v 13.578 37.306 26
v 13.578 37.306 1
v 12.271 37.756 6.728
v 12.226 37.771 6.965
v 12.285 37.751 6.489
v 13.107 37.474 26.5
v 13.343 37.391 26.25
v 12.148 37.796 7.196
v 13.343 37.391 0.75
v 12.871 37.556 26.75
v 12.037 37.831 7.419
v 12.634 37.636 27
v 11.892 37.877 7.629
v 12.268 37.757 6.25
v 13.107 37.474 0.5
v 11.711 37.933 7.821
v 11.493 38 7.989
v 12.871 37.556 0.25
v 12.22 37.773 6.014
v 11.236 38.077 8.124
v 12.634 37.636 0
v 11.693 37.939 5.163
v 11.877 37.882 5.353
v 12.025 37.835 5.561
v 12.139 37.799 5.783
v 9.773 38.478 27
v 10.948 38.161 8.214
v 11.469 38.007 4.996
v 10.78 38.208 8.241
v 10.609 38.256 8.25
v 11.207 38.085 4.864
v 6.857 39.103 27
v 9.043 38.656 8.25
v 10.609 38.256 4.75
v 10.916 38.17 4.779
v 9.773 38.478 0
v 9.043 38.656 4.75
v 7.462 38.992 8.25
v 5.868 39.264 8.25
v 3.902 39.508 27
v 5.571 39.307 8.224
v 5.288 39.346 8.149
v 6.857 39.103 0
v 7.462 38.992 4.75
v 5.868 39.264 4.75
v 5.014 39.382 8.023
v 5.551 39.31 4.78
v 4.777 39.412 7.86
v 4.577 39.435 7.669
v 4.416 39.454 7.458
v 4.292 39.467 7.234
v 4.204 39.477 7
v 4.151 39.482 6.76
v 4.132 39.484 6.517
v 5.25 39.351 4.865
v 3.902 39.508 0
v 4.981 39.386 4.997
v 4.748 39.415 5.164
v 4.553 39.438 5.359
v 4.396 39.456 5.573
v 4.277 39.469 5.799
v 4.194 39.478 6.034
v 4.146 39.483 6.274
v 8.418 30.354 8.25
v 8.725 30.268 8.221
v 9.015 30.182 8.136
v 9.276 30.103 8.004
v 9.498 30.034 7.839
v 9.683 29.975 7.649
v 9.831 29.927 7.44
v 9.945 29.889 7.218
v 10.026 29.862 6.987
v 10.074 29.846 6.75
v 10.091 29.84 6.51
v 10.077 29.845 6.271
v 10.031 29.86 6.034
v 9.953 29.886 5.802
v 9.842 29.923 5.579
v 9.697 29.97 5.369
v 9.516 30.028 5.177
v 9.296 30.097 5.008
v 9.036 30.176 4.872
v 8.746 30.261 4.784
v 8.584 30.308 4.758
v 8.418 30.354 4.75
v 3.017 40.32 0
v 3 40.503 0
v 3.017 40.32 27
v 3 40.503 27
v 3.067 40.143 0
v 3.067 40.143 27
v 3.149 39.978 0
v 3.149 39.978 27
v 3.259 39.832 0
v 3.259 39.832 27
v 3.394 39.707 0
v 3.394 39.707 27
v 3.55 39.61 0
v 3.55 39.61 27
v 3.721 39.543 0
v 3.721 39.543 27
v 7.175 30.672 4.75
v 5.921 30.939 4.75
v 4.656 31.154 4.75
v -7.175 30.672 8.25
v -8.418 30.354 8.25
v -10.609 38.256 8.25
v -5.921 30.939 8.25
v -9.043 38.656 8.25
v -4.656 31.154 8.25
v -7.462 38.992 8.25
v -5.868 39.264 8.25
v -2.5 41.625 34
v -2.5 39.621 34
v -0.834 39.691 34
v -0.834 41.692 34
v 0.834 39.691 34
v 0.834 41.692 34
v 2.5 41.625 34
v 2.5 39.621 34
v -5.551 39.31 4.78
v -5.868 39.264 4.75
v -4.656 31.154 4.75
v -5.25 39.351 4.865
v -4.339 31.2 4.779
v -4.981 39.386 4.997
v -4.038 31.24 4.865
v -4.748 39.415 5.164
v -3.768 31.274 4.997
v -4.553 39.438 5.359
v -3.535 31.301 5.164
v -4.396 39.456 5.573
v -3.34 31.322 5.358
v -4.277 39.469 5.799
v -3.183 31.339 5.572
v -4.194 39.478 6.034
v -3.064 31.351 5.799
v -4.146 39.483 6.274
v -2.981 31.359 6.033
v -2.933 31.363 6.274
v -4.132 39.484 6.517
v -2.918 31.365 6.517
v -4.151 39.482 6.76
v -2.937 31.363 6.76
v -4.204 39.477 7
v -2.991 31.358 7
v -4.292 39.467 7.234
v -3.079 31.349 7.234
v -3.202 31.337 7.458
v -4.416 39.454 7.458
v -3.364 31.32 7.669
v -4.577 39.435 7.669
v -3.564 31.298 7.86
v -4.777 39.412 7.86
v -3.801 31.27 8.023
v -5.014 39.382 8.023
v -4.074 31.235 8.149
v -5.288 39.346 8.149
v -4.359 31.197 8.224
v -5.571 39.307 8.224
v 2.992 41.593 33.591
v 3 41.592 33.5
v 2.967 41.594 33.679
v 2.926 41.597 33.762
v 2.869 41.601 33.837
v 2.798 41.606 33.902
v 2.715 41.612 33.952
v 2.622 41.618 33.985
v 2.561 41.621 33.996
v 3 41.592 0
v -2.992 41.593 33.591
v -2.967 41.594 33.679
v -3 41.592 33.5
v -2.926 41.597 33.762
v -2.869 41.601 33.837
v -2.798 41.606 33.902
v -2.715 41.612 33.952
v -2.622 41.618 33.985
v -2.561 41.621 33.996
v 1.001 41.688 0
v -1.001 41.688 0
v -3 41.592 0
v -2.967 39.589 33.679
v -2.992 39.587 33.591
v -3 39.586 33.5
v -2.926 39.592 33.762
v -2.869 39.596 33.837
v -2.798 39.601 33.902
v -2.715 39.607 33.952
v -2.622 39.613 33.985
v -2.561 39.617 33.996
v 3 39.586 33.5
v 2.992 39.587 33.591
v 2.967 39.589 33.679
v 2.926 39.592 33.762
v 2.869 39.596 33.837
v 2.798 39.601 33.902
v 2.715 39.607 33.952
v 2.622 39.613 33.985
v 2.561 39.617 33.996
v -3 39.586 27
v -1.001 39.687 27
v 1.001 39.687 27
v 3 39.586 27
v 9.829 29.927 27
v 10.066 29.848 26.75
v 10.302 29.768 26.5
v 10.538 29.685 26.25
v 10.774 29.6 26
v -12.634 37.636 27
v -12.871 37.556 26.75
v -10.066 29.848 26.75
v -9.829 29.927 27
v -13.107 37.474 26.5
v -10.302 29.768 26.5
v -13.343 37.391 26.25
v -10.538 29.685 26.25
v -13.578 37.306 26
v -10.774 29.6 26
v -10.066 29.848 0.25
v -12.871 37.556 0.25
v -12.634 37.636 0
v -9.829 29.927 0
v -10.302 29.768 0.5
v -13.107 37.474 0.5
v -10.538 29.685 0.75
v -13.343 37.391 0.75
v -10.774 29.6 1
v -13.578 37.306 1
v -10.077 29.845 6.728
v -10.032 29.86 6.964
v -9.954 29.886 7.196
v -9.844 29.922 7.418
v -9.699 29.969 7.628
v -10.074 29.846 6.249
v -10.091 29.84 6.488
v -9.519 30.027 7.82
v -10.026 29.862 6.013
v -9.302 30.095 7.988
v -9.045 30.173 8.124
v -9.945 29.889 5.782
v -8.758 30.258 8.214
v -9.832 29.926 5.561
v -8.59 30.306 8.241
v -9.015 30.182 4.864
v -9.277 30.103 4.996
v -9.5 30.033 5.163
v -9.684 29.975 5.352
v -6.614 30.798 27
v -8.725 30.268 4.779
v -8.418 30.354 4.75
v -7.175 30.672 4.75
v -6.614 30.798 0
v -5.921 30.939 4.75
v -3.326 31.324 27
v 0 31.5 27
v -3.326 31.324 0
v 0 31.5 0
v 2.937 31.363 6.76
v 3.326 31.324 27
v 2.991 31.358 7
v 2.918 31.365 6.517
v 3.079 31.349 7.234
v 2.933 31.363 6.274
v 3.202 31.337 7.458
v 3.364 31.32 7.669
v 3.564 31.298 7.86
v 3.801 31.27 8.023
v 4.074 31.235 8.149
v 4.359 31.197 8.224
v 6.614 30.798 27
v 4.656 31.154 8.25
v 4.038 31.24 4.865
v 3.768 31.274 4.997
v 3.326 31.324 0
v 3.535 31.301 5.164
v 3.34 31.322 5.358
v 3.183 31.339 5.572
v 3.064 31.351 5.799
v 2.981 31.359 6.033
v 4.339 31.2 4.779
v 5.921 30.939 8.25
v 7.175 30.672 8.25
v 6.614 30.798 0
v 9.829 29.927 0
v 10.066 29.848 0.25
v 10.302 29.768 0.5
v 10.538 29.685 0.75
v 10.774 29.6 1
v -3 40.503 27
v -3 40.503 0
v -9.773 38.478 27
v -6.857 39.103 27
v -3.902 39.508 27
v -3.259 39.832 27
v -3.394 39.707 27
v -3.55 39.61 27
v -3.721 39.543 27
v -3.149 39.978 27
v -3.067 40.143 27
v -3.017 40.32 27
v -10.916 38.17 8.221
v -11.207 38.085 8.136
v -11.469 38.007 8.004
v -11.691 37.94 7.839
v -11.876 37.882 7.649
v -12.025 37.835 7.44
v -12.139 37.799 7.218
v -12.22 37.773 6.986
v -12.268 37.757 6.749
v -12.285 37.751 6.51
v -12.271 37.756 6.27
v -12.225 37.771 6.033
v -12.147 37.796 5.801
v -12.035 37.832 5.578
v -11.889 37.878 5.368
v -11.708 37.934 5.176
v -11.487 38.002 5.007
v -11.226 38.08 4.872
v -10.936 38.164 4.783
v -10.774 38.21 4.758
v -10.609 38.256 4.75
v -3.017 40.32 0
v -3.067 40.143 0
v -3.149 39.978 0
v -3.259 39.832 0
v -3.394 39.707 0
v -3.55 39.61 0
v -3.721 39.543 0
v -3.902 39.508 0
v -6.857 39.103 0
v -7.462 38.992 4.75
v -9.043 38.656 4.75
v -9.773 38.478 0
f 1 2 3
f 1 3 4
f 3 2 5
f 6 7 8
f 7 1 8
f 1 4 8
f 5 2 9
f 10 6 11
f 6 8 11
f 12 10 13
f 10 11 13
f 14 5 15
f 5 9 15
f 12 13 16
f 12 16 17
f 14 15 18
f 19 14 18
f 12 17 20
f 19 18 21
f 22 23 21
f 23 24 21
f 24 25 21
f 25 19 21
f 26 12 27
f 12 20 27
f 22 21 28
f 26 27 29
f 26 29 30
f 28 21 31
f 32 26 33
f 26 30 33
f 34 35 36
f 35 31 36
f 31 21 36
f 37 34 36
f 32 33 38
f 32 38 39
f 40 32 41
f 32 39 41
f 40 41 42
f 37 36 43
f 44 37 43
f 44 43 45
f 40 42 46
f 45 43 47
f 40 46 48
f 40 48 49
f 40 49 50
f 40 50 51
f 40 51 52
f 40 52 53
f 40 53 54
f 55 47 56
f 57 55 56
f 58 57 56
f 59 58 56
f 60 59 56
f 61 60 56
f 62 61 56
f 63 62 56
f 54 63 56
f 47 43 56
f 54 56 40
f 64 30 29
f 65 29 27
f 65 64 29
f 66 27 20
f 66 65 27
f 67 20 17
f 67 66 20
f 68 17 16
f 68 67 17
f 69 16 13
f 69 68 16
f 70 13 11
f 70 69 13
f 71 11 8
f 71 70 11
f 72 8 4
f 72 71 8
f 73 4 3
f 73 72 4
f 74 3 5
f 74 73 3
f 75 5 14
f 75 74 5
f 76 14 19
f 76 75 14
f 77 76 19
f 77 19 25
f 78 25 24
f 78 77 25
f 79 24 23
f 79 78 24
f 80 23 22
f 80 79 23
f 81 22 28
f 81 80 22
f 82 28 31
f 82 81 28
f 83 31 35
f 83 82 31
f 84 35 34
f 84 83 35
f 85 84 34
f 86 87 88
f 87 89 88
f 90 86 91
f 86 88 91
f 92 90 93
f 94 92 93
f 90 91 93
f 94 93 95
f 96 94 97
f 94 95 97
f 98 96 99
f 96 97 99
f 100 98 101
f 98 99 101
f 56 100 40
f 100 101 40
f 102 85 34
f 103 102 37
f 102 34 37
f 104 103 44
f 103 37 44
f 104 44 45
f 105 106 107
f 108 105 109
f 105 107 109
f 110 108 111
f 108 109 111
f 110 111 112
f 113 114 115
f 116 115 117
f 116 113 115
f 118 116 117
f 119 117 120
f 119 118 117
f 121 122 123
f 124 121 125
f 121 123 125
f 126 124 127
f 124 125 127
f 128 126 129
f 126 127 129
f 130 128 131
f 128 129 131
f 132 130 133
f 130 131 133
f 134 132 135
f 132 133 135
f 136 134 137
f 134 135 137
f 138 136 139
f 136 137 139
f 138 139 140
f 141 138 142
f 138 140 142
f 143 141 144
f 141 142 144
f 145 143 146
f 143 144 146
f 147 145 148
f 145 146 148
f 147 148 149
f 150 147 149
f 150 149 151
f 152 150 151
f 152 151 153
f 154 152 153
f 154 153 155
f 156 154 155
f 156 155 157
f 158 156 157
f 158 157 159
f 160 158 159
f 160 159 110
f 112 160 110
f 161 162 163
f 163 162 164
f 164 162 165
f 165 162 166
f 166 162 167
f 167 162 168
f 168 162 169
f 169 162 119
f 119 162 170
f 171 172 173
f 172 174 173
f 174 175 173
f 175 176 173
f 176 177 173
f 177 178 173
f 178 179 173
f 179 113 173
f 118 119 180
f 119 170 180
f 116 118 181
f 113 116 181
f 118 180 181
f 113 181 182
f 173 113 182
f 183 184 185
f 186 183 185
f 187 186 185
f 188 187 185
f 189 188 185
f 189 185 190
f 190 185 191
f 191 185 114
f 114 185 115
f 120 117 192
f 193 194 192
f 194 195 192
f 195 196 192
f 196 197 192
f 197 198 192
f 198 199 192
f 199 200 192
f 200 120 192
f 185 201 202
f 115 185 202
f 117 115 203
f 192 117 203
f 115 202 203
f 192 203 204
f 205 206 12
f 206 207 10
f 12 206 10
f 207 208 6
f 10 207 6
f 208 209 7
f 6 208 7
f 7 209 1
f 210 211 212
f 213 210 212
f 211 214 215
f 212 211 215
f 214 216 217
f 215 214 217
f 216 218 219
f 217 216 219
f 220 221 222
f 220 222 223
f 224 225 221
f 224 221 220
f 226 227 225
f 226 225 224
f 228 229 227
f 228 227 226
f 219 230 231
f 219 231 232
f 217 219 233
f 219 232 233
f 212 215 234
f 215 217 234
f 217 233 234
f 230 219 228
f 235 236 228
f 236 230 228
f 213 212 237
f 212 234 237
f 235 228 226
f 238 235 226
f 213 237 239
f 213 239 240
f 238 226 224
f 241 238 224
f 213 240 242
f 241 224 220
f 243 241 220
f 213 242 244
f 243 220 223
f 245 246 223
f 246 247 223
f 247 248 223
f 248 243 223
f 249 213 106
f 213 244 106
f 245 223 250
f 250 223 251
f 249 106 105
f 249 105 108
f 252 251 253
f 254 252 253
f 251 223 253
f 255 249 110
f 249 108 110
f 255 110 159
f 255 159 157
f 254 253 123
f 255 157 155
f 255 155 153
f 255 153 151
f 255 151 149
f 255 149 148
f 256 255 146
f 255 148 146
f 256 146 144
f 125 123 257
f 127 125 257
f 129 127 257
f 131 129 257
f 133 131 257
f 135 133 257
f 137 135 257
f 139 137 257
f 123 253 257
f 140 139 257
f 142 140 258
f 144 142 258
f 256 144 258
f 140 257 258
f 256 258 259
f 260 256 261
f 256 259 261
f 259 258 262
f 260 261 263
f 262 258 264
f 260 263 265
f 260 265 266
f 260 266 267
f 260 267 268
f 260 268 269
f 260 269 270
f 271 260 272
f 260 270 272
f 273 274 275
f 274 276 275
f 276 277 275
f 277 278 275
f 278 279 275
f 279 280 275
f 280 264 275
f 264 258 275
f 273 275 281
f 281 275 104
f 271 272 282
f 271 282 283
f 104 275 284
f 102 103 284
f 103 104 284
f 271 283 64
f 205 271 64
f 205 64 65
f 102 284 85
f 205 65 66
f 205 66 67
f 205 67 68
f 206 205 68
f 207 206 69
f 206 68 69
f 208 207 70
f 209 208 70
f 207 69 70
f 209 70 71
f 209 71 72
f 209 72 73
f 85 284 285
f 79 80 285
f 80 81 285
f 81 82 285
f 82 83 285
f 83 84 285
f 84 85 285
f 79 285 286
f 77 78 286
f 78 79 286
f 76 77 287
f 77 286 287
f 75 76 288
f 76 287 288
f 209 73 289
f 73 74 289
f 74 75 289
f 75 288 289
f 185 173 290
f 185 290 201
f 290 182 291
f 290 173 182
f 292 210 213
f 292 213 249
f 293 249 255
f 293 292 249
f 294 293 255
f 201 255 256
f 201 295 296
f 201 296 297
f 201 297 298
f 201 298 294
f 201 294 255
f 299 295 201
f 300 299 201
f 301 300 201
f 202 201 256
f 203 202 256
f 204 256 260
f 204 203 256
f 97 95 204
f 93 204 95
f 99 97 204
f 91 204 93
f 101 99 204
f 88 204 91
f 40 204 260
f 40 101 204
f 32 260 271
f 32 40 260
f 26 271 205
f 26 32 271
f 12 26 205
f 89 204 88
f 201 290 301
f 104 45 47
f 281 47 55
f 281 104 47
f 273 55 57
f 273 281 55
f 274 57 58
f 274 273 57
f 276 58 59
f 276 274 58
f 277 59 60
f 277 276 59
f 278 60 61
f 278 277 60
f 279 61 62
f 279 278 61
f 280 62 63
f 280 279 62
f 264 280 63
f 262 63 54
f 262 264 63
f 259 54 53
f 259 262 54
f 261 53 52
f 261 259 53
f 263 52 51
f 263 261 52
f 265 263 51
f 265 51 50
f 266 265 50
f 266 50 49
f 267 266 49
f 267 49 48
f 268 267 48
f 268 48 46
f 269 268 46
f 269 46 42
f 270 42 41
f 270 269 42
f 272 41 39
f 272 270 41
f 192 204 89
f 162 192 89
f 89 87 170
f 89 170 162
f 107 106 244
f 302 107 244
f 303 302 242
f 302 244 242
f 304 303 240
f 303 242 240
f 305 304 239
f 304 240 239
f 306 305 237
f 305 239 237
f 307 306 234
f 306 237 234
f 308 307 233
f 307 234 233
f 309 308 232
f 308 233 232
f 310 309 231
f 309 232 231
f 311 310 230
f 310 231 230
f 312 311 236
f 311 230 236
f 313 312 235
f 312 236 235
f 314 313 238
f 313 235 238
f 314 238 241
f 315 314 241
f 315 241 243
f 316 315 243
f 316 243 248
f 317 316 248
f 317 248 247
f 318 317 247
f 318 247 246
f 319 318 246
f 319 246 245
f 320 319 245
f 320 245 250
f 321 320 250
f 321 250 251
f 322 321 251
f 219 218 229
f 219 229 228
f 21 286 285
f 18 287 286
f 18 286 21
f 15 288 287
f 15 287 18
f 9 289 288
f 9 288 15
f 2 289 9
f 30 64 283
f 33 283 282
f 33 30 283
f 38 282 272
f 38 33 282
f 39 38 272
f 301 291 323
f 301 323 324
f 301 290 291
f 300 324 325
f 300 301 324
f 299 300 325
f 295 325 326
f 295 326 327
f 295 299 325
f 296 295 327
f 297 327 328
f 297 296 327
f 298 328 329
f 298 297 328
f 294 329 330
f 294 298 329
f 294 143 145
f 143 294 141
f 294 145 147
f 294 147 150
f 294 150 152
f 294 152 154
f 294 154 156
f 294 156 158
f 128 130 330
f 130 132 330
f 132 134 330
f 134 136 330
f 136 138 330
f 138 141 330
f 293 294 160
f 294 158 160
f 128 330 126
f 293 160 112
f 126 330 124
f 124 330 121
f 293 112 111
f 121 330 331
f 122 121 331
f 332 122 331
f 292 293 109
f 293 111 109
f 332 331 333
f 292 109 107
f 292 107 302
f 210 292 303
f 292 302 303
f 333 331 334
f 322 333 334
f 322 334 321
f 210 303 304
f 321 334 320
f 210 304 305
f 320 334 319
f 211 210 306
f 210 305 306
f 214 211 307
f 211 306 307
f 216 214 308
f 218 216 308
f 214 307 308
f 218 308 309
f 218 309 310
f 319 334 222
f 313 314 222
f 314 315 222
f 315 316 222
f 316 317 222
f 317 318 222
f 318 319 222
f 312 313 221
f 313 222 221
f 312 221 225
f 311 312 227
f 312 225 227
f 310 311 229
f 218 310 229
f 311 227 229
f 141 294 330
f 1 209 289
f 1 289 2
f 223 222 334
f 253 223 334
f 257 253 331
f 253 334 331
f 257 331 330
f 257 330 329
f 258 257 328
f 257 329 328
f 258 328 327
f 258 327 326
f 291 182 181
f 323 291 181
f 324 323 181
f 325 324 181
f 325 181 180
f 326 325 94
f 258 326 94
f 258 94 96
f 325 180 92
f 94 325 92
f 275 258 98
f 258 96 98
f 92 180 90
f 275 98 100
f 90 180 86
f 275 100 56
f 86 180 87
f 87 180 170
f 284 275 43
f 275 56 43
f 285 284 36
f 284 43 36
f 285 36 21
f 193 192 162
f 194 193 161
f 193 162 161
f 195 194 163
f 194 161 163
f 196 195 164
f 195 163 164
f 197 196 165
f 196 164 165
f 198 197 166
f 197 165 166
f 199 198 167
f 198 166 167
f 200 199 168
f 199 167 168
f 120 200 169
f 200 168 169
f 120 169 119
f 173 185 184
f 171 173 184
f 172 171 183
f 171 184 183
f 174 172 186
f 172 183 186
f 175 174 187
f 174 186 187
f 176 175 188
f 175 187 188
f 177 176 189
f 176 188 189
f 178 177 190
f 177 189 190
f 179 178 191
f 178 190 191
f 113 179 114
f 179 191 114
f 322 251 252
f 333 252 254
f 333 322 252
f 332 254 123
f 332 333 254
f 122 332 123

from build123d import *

# Parameters (mm, degrees)
EXTRUDE_1_DEPTH          = 27
EXTRUDE_2_DEPTH          = 7
PATTERN_CIRCULAR_1_COUNT = 2
PATTERN_CIRCULAR_1_ANGLE = 7
CUT_EXTRUDE_2_DEPTH      = 1.75
FILLET_1_R               = 1
CHAMFER_1_SIZE           = 1
FILLET_2_R               = 0.5


with BuildPart() as part:
    # Эскиз1 → Бобышка-Вытянуть1 (new body)
    with BuildSketch(Plane.XY):
        with BuildLine():
            Line((10.773634515, 29.600317555), (13.57819969, 37.305797045))
            ThreePointArc((13.57819969, 37.305797045), (8.367171779, 38.808252169), (3, 39.586487594))
            Line((3, 39.586487594), (3, 41.591946336))
            ThreePointArc((3, 41.591946336), (0, 41.7), (-3, 41.591946336))
            Line((-3, 41.591946336), (-3, 39.586487594))
            ThreePointArc((-3, 39.586487594), (-8.367171779, 38.808252169), (-13.57819969, 37.305797045))
            Line((-13.57819969, 37.305797045), (-10.773634515, 29.600317555))
            ThreePointArc((-10.773634515, 29.600317555), (0, 31.5), (10.773634515, 29.600317555))
        make_face()
    extrude(amount=EXTRUDE_1_DEPTH)

    # Эскиз2 → Бобышка-Вытянуть2 (add)
    with BuildSketch(Plane.XY.offset(27)):
        with BuildLine():
            Line((3, 39.586487594), (3, 41.591946336))
            ThreePointArc((3, 41.591946336), (0, 41.7), (-3, 41.591946336))
            Line((-3, 41.591946336), (-3, 39.586487594))
            ThreePointArc((-3, 39.586487594), (0, 39.7), (3, 39.586487594))
        make_face()
    extrude(amount=EXTRUDE_2_DEPTH)

    # Эскиз4 → Вырез-Повернуть1 (revolve, cut)
    with BuildSketch(Plane.XY.offset(6.5)):
        Polygon((13.712080217, 42.895703236), (8.367312695, 23.623094172), (6.680959402, 24.09076133), (12.025726924, 43.363370394), align=None)
    cut_revolve_1 = revolve(axis=Axis((0, 0, 6.5), (0.2672383760782575, 0.9636304532086228, 0)), mode=Mode.SUBTRACT)

    # Круговой массив1: Вырез-Повернуть1 ×2 about axis
    pattern_circular_1_axis = Axis((0, 0, 27), (0, 0, 1))
    for i in range(1, PATTERN_CIRCULAR_1_COUNT):
        add(cut_revolve_1.rotate(pattern_circular_1_axis, i * PATTERN_CIRCULAR_1_ANGLE / (PATTERN_CIRCULAR_1_COUNT - 1)), mode=Mode.SUBTRACT)

    # Эскиз6 → Вырез-Вытянуть2 (cut, symmetric)
    with BuildSketch(Plane.XY.offset(6.5)):
        with BuildLine():
            Line((4.655996451, 31.153999696), (5.868033622, 39.263929775))
            ThreePointArc((5.868033622, 39.263929775), (8.254094125, 38.832459749), (10.60936353, 38.256128992))
            Line((10.60936353, 38.256128992), (8.418008846, 30.354359276))
            ThreePointArc((8.418008846, 30.354359276), (6.549218261, 30.811649423), (4.655996451, 31.153999696))
        make_face()
    cut_extrude_2 = extrude(amount=CUT_EXTRUDE_2_DEPTH, both=True, mode=Mode.SUBTRACT)

    # Зеркальное отражение1: Вырез-Повернуть1, Вырез-Вытянуть2 across plane
    add(cut_revolve_1.mirror(Plane(origin=(0, 0, 0), x_dir=(0, 0, 1), z_dir=(1, 0, 0))), mode=Mode.SUBTRACT)
    add(cut_extrude_2.mirror(Plane(origin=(0, 0, 0), x_dir=(0, 0, 1), z_dir=(1, 0, 0))), mode=Mode.SUBTRACT)

    # Зеркальное отражение1 copy 1 sketch → Зеркальное отражение1 copy 1 (revolve, cut)
    with BuildSketch(Plane(origin=(0, 0, 6.5), x_dir=(-0.992546151641322, 0.12186934340514775, 0), z_dir=(0, 0, 1))):
        Polygon((13.712080217, -42.895703236), (8.367312695, -23.623094172), (6.680959402, -24.09076133), (12.025726924, -43.363370394), align=None)
    revolve(axis=Axis((0, 0, 6.5), (0.147809411129611, -0.9890158633619167, 0)), mode=Mode.SUBTRACT)

    # Скругление1
    fillet_1_edges = [part.edges().sort_by_distance(p)[0] for p in [
        (-3, 39.586487594, 13.5),
        (3, 39.586487594, 13.5),
    ]]
    fillet(fillet_1_edges, radius=FILLET_1_R)

    # Фаска1
    chamfer_1_edges = [part.edges().sort_by_distance(p)[0] for p in [
        (12.175917102, 33.4530573, 0),
        (-12.175917102, 33.4530573, 27),
        (-12.175917102, 33.4530573, 0),
        (12.175917102, 33.4530573, 27),
    ]]
    chamfer(chamfer_1_edges, length=CHAMFER_1_SIZE)

    # Скругление2
    fillet_2_edges = [part.edges().sort_by_distance(p)[0] for p in [
        (-3, 40.589216965, 34),
        (3, 40.589216965, 34),
    ]]
    fillet(fillet_2_edges, radius=FILLET_2_R)


solid = part.part
